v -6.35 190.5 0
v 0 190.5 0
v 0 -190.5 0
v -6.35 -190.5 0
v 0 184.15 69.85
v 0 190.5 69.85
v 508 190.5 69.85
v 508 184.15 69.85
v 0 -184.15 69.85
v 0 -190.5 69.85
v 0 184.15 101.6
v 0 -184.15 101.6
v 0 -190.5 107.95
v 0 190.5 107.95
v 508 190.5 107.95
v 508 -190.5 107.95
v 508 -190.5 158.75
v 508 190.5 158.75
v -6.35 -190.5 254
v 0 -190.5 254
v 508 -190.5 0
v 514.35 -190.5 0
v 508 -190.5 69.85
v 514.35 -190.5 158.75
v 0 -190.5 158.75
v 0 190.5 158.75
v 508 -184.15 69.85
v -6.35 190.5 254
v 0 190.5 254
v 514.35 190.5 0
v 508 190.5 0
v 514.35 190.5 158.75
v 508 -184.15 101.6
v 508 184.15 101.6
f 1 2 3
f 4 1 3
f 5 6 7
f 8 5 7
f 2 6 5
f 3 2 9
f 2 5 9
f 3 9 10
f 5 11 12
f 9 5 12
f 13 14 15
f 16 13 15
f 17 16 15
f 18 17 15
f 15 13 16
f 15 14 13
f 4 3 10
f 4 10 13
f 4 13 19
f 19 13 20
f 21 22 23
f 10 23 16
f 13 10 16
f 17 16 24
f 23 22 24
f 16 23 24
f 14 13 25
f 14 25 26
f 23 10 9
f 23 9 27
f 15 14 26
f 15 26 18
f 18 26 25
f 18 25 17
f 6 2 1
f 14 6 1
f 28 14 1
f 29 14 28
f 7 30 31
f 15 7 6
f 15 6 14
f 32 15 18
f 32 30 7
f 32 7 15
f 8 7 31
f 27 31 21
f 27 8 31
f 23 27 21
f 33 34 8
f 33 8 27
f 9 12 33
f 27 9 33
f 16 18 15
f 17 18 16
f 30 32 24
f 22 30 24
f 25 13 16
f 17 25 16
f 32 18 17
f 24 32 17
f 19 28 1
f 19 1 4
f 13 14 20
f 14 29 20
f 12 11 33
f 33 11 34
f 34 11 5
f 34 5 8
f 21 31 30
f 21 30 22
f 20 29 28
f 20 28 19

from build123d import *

# Parameters (mm, degrees)
F1_W      = 190.5
F1_H      = 158.75
F2_DEPTH  = 6.35
F3_W      = 190.5
F3_H      = 254
F4_DEPTH  = 6.35
F5_W      = 508
F5_H      = 38.1
F6_DEPTH  = 6.35
F8_W      = 508
F8_H      = 368.3
F9_DEPTH  = 6.35
F10_W     = 508
F10_H     = 381
F11_DEPTH = 50.8


with BuildPart() as f2:
    # F1 (on offset) → F2 (new body)
    with BuildSketch(Plane.YZ.offset(508)):
        with Locations((-95.25, 79.375)):
            Rectangle(F1_W, F1_H)
    extrude(amount=F2_DEPTH)



with BuildPart() as f4:
    # F3 (on Right) → F4 (new body)
    with BuildSketch(Plane.YZ):
        with Locations((-95.25, 127)):
            Rectangle(F3_W, F3_H)
    extrude(amount=-F4_DEPTH)


with BuildPart() as f2_1:
    add(f2.part)

    add(f4.part)  # F6 merges F4
    # F5 (on face) → F6 (join)
    with BuildSketch(Plane.XZ.offset(190.5)):
        with Locations((254, 88.9)):
            Rectangle(F5_W, F5_H)
    extrude(amount=-F6_DEPTH)

    # F7: F2 across plane


with BuildPart() as f2_2:
    add(f2_1.part)
    add(f2_1.part.mirror(Plane.XZ))

    # F8 (on face) → F9 (join)
    with BuildSketch(Plane.XY.offset(107.95)):
        with Locations((254, 0)):
            Rectangle(F8_W, F8_H)
    extrude(amount=-F9_DEPTH)


with BuildPart() as f11:
    # F10 (on face) → F11 (new body)
    with BuildSketch(Plane.XY.offset(107.95)):
        with Locations((254, 0)):
            Rectangle(F10_W, F10_H)
    extrude(amount=F11_DEPTH)


solid = Compound([f2_2.part, f11.part])
